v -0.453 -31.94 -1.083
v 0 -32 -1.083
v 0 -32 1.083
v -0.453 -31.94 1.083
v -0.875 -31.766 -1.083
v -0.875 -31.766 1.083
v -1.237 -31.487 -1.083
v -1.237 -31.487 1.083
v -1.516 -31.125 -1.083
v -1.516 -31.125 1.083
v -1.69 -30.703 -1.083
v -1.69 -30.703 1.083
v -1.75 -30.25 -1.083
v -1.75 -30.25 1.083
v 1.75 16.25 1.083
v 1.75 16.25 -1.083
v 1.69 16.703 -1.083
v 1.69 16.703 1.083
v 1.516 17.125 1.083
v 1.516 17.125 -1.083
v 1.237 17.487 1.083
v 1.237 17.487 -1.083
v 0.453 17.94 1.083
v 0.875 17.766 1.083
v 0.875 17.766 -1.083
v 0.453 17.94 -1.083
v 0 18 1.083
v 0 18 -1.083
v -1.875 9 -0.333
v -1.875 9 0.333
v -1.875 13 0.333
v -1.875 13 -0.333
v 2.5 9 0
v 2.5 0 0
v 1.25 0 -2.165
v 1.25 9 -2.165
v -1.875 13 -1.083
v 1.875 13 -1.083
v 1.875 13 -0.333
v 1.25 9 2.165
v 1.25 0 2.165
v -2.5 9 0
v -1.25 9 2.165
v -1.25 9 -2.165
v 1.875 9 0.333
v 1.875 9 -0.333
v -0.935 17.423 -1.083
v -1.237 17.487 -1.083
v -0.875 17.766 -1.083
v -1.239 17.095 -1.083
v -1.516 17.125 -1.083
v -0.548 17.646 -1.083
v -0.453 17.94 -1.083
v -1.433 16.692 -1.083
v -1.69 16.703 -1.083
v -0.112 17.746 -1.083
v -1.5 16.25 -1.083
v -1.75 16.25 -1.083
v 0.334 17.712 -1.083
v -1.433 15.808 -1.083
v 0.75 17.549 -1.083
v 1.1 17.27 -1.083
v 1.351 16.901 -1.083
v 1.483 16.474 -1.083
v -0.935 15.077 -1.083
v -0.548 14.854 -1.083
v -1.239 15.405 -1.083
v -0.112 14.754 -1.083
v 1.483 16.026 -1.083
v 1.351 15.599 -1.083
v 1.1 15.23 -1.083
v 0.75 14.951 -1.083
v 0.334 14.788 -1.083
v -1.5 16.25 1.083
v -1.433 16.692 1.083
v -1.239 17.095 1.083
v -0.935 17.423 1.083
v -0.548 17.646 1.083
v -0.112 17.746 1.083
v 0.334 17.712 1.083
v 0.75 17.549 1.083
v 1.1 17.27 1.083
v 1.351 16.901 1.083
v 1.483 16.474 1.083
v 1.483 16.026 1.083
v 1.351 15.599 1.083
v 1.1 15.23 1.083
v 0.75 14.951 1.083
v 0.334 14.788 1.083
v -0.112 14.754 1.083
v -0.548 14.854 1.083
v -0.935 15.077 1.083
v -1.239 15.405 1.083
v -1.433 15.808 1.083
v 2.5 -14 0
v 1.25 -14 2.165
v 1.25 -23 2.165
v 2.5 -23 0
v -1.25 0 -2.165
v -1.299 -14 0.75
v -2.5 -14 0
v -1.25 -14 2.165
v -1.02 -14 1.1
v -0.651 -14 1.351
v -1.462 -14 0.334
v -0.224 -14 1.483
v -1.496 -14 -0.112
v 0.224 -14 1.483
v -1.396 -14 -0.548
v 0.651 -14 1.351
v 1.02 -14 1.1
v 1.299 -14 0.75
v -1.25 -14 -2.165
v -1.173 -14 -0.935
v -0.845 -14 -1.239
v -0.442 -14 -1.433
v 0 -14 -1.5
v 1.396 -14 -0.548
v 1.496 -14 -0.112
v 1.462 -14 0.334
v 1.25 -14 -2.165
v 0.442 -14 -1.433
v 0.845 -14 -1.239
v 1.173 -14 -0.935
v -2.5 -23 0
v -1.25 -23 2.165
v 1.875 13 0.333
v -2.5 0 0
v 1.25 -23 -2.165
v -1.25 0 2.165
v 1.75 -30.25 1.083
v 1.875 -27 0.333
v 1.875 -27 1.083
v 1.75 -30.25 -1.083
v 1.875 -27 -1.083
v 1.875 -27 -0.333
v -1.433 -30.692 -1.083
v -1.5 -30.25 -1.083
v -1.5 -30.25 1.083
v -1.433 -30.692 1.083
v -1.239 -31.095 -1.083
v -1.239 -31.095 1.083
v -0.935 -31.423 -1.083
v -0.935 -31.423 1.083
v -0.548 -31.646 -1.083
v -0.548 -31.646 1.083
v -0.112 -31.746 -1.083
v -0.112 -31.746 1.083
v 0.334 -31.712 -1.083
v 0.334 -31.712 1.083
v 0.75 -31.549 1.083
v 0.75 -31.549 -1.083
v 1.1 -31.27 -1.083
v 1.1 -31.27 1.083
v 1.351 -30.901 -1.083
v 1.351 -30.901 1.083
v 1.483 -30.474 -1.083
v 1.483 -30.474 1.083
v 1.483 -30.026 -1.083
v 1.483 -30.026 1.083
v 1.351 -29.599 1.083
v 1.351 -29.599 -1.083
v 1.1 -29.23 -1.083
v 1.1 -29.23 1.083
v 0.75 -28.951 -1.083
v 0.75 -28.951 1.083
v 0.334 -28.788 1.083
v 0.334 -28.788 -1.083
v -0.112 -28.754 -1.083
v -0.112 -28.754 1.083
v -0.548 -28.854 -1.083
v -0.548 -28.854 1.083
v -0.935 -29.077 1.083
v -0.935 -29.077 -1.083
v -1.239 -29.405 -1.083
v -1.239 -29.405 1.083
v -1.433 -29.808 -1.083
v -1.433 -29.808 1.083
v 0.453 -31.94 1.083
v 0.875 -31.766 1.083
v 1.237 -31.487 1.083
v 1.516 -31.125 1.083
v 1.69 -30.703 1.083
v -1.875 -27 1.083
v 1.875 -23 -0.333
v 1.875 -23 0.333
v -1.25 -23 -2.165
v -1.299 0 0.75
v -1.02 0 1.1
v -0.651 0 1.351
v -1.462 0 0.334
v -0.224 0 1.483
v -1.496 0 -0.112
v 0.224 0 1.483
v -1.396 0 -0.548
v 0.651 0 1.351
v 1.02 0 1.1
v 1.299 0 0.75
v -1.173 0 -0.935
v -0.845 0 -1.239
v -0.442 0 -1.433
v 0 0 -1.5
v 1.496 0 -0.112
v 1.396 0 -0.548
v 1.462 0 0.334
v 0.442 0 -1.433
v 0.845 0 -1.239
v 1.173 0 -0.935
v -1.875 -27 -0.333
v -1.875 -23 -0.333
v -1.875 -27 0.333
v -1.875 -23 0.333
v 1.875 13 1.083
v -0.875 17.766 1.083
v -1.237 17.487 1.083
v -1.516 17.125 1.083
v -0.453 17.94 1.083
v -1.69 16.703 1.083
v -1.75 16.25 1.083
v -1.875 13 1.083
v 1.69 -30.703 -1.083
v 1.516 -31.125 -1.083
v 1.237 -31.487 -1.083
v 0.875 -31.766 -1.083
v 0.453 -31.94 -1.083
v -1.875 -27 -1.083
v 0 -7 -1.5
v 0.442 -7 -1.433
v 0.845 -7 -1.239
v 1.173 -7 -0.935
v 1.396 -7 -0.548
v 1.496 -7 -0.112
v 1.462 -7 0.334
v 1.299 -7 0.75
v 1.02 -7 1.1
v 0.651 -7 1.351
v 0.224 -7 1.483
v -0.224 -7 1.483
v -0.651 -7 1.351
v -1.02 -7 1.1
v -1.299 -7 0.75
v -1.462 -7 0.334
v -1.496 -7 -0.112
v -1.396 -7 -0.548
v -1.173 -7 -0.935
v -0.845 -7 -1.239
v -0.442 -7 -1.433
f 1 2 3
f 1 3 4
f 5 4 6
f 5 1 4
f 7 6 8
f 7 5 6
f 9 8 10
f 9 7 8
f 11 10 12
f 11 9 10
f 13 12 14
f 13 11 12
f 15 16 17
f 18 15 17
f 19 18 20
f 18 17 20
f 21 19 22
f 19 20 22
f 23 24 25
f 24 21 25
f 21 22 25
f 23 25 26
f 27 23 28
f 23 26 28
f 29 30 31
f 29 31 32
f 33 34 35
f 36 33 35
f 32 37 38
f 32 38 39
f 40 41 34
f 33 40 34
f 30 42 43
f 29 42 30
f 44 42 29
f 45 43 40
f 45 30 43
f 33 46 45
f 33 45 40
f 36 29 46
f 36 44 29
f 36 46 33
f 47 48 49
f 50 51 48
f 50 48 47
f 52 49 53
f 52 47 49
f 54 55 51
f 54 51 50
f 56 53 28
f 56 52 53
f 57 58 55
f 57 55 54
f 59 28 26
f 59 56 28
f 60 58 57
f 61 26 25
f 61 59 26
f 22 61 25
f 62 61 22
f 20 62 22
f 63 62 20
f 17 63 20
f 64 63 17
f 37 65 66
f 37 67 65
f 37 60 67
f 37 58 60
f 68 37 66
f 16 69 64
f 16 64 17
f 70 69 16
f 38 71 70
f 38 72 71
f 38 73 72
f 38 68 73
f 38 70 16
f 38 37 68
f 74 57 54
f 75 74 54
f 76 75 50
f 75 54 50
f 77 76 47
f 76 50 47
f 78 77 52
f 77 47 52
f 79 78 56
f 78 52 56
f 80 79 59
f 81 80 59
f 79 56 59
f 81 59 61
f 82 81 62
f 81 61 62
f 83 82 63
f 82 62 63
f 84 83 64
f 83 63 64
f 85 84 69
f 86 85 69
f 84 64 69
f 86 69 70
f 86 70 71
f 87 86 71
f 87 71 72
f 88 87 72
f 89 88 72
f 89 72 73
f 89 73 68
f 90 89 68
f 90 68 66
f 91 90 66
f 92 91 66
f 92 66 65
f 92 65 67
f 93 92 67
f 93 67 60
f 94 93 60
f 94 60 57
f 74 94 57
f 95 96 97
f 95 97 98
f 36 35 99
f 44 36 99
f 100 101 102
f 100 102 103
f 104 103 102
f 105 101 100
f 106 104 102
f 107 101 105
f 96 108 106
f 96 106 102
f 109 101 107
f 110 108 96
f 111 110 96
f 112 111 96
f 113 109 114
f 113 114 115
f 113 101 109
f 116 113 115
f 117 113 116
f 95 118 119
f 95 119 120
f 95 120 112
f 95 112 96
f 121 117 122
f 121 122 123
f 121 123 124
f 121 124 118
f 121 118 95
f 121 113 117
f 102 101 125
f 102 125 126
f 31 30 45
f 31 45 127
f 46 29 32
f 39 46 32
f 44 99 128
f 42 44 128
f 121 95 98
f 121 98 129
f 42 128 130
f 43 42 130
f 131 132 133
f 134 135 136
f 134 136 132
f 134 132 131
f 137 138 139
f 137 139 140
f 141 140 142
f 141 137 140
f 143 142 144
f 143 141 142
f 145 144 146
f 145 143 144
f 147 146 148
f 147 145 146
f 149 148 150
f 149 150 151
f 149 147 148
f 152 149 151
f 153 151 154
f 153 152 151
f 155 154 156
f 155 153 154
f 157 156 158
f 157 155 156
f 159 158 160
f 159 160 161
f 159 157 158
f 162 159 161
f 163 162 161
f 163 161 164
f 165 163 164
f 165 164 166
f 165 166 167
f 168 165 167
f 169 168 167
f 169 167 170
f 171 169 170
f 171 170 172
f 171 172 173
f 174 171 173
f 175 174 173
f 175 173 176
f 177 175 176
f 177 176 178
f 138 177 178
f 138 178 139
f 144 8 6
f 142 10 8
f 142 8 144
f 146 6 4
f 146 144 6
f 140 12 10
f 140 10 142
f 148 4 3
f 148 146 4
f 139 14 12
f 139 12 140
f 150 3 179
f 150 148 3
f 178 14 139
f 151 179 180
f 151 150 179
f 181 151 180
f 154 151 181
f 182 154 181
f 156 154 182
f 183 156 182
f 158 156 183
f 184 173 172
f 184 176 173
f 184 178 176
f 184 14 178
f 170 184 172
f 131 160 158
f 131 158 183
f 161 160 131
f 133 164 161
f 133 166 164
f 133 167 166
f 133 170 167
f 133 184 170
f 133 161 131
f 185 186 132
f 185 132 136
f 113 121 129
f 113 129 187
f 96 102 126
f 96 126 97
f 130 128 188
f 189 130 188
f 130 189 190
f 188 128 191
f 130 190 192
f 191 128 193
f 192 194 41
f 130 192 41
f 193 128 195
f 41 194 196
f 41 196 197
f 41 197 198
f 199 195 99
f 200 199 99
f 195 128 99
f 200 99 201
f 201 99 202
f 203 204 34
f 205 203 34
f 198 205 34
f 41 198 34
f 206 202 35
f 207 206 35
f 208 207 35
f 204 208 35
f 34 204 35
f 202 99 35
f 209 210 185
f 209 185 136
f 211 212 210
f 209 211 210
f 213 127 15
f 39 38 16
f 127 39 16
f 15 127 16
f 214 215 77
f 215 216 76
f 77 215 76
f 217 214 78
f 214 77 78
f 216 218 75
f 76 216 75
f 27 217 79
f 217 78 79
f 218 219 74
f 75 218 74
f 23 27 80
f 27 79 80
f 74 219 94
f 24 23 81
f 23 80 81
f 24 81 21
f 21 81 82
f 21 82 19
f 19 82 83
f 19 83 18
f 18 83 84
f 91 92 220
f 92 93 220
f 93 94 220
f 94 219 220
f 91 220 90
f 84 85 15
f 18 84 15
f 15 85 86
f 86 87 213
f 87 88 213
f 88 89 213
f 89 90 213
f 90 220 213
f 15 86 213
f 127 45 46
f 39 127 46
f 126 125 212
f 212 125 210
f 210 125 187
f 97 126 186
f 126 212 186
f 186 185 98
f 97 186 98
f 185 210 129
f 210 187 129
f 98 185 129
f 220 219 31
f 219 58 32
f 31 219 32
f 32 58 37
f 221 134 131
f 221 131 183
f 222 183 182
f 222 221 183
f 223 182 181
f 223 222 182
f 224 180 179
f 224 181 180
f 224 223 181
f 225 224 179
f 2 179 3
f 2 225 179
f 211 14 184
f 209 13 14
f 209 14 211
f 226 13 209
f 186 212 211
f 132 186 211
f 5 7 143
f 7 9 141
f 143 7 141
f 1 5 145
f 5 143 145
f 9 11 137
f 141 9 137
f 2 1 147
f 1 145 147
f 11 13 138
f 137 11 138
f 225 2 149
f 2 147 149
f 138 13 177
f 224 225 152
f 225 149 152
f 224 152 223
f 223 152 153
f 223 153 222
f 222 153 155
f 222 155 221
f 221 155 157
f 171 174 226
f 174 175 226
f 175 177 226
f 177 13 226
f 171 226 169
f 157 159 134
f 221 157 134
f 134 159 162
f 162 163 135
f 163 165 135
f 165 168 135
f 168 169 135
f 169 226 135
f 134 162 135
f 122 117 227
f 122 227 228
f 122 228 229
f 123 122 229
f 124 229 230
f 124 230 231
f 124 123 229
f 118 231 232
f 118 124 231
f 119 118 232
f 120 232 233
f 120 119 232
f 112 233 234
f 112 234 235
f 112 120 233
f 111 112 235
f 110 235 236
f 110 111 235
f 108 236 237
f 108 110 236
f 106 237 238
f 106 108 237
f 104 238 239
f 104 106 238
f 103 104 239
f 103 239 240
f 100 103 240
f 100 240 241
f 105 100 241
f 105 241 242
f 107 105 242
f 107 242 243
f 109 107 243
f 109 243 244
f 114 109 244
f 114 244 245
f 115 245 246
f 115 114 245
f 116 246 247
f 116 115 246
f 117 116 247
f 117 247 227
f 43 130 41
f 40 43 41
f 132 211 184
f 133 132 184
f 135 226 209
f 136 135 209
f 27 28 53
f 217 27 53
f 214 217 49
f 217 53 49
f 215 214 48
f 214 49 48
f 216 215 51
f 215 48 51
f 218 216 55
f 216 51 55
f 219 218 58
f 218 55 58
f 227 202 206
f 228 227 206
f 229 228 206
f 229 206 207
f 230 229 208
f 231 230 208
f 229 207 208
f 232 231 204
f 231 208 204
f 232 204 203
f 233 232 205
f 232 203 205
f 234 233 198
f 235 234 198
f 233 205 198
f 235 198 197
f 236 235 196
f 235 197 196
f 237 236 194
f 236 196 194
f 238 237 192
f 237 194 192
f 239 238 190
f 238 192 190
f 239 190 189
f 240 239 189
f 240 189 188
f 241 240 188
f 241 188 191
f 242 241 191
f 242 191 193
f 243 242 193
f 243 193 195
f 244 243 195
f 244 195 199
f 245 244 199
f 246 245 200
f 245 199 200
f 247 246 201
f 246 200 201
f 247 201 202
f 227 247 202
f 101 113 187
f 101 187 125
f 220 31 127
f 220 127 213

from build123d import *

# Parameters (mm, degrees)
BOSS_EXTRUDE1_DEPTH = 9
SKETCH2_R           = 1.5
BOSS_EXTRUDE2_DEPTH = 7
SKETCH3_W           = 3.75
SKETCH3_H           = 2.16506351
BOSS_EXTRUDE3_DEPTH = 9
SKETCH4_W           = 0.75
SKETCH4_H           = 4
CUT_EXTRUDE1_DEPTH  = 19.650150804
SKETCH5_R           = 1.5
CUT_EXTRUDE2_DEPTH  = 19.460684576


with BuildPart() as part:
    # Sketch1 → Boss-Extrude1 (new body)
    with BuildSketch(Plane(origin=(0, 0, 0), x_dir=(1, 0, 0), z_dir=(0, 1, 0))):
        Polygon((2.5, 0), (1.25, 2.165063509), (-1.25, 2.165063509), (-2.5, 0), (-1.25, -2.165063509), (1.25, -2.165063509), align=None)
    extrude(amount=BOSS_EXTRUDE1_DEPTH)

    # Sketch2 → Boss-Extrude2 (add)
    with BuildSketch(Plane.XZ):
        with Locations(Location((0, 0, 0), (0, 0, 270))):
            Circle(SKETCH2_R)
    extrude(amount=BOSS_EXTRUDE2_DEPTH)

    # Sketch3 → Boss-Extrude3 (add)
    with BuildSketch(Plane(origin=(0, 9, 0), x_dir=(1, 0, 0), z_dir=(0, 1, 0))):
        Rectangle(SKETCH3_W, SKETCH3_H)
    extrude(amount=BOSS_EXTRUDE3_DEPTH)

    # Sketch4 → Cut-Extrude1 (cut, through all)
    with BuildSketch(Plane.ZY.offset(1.875)):
        with Locations((-0.707531755, 11)):
            Rectangle(SKETCH4_W, SKETCH4_H)
        with Locations((0.707531755, 11)):
            Rectangle(SKETCH4_W, SKETCH4_H)
    extrude(amount=-CUT_EXTRUDE1_DEPTH, mode=Mode.SUBTRACT)

    # Sketch5 → Cut-Extrude2 (cut, through all)
    with BuildSketch(Plane(origin=(0, 0, -1.082531755), x_dir=(-1, 0, 0), z_dir=(0, 0, -1))):
        with Locations((0, 16.25)):
            Circle(SKETCH5_R)
        with BuildLine():
            ThreePointArc((-1.75, 16.25), (-1.237436867, 17.487436868), (2e-09, 18))
            Line((2e-09, 18), (-1.875, 18))
            Line((-1.875, 18), (-1.875, 13))
            Line((-1.875, 13), (-1.75, 16.25))
        make_face()
        with BuildLine():
            ThreePointArc((2e-09, 18), (1.237436868, 17.487436867), (1.75, 16.25))
            Line((1.75, 16.25), (1.875, 13))
            Line((1.875, 13), (1.875, 18))
            Line((1.875, 18), (2e-09, 18))
        make_face()
    extrude(amount=-CUT_EXTRUDE2_DEPTH, mode=Mode.SUBTRACT)

    # Mirror1: part across plane


with BuildPart() as part_1:
    add(part.part)
    add(part.part.mirror(Plane(origin=(0, -7, 0), x_dir=(0, 0, 1), z_dir=(0, -1, 0))))


solid = part_1.part
